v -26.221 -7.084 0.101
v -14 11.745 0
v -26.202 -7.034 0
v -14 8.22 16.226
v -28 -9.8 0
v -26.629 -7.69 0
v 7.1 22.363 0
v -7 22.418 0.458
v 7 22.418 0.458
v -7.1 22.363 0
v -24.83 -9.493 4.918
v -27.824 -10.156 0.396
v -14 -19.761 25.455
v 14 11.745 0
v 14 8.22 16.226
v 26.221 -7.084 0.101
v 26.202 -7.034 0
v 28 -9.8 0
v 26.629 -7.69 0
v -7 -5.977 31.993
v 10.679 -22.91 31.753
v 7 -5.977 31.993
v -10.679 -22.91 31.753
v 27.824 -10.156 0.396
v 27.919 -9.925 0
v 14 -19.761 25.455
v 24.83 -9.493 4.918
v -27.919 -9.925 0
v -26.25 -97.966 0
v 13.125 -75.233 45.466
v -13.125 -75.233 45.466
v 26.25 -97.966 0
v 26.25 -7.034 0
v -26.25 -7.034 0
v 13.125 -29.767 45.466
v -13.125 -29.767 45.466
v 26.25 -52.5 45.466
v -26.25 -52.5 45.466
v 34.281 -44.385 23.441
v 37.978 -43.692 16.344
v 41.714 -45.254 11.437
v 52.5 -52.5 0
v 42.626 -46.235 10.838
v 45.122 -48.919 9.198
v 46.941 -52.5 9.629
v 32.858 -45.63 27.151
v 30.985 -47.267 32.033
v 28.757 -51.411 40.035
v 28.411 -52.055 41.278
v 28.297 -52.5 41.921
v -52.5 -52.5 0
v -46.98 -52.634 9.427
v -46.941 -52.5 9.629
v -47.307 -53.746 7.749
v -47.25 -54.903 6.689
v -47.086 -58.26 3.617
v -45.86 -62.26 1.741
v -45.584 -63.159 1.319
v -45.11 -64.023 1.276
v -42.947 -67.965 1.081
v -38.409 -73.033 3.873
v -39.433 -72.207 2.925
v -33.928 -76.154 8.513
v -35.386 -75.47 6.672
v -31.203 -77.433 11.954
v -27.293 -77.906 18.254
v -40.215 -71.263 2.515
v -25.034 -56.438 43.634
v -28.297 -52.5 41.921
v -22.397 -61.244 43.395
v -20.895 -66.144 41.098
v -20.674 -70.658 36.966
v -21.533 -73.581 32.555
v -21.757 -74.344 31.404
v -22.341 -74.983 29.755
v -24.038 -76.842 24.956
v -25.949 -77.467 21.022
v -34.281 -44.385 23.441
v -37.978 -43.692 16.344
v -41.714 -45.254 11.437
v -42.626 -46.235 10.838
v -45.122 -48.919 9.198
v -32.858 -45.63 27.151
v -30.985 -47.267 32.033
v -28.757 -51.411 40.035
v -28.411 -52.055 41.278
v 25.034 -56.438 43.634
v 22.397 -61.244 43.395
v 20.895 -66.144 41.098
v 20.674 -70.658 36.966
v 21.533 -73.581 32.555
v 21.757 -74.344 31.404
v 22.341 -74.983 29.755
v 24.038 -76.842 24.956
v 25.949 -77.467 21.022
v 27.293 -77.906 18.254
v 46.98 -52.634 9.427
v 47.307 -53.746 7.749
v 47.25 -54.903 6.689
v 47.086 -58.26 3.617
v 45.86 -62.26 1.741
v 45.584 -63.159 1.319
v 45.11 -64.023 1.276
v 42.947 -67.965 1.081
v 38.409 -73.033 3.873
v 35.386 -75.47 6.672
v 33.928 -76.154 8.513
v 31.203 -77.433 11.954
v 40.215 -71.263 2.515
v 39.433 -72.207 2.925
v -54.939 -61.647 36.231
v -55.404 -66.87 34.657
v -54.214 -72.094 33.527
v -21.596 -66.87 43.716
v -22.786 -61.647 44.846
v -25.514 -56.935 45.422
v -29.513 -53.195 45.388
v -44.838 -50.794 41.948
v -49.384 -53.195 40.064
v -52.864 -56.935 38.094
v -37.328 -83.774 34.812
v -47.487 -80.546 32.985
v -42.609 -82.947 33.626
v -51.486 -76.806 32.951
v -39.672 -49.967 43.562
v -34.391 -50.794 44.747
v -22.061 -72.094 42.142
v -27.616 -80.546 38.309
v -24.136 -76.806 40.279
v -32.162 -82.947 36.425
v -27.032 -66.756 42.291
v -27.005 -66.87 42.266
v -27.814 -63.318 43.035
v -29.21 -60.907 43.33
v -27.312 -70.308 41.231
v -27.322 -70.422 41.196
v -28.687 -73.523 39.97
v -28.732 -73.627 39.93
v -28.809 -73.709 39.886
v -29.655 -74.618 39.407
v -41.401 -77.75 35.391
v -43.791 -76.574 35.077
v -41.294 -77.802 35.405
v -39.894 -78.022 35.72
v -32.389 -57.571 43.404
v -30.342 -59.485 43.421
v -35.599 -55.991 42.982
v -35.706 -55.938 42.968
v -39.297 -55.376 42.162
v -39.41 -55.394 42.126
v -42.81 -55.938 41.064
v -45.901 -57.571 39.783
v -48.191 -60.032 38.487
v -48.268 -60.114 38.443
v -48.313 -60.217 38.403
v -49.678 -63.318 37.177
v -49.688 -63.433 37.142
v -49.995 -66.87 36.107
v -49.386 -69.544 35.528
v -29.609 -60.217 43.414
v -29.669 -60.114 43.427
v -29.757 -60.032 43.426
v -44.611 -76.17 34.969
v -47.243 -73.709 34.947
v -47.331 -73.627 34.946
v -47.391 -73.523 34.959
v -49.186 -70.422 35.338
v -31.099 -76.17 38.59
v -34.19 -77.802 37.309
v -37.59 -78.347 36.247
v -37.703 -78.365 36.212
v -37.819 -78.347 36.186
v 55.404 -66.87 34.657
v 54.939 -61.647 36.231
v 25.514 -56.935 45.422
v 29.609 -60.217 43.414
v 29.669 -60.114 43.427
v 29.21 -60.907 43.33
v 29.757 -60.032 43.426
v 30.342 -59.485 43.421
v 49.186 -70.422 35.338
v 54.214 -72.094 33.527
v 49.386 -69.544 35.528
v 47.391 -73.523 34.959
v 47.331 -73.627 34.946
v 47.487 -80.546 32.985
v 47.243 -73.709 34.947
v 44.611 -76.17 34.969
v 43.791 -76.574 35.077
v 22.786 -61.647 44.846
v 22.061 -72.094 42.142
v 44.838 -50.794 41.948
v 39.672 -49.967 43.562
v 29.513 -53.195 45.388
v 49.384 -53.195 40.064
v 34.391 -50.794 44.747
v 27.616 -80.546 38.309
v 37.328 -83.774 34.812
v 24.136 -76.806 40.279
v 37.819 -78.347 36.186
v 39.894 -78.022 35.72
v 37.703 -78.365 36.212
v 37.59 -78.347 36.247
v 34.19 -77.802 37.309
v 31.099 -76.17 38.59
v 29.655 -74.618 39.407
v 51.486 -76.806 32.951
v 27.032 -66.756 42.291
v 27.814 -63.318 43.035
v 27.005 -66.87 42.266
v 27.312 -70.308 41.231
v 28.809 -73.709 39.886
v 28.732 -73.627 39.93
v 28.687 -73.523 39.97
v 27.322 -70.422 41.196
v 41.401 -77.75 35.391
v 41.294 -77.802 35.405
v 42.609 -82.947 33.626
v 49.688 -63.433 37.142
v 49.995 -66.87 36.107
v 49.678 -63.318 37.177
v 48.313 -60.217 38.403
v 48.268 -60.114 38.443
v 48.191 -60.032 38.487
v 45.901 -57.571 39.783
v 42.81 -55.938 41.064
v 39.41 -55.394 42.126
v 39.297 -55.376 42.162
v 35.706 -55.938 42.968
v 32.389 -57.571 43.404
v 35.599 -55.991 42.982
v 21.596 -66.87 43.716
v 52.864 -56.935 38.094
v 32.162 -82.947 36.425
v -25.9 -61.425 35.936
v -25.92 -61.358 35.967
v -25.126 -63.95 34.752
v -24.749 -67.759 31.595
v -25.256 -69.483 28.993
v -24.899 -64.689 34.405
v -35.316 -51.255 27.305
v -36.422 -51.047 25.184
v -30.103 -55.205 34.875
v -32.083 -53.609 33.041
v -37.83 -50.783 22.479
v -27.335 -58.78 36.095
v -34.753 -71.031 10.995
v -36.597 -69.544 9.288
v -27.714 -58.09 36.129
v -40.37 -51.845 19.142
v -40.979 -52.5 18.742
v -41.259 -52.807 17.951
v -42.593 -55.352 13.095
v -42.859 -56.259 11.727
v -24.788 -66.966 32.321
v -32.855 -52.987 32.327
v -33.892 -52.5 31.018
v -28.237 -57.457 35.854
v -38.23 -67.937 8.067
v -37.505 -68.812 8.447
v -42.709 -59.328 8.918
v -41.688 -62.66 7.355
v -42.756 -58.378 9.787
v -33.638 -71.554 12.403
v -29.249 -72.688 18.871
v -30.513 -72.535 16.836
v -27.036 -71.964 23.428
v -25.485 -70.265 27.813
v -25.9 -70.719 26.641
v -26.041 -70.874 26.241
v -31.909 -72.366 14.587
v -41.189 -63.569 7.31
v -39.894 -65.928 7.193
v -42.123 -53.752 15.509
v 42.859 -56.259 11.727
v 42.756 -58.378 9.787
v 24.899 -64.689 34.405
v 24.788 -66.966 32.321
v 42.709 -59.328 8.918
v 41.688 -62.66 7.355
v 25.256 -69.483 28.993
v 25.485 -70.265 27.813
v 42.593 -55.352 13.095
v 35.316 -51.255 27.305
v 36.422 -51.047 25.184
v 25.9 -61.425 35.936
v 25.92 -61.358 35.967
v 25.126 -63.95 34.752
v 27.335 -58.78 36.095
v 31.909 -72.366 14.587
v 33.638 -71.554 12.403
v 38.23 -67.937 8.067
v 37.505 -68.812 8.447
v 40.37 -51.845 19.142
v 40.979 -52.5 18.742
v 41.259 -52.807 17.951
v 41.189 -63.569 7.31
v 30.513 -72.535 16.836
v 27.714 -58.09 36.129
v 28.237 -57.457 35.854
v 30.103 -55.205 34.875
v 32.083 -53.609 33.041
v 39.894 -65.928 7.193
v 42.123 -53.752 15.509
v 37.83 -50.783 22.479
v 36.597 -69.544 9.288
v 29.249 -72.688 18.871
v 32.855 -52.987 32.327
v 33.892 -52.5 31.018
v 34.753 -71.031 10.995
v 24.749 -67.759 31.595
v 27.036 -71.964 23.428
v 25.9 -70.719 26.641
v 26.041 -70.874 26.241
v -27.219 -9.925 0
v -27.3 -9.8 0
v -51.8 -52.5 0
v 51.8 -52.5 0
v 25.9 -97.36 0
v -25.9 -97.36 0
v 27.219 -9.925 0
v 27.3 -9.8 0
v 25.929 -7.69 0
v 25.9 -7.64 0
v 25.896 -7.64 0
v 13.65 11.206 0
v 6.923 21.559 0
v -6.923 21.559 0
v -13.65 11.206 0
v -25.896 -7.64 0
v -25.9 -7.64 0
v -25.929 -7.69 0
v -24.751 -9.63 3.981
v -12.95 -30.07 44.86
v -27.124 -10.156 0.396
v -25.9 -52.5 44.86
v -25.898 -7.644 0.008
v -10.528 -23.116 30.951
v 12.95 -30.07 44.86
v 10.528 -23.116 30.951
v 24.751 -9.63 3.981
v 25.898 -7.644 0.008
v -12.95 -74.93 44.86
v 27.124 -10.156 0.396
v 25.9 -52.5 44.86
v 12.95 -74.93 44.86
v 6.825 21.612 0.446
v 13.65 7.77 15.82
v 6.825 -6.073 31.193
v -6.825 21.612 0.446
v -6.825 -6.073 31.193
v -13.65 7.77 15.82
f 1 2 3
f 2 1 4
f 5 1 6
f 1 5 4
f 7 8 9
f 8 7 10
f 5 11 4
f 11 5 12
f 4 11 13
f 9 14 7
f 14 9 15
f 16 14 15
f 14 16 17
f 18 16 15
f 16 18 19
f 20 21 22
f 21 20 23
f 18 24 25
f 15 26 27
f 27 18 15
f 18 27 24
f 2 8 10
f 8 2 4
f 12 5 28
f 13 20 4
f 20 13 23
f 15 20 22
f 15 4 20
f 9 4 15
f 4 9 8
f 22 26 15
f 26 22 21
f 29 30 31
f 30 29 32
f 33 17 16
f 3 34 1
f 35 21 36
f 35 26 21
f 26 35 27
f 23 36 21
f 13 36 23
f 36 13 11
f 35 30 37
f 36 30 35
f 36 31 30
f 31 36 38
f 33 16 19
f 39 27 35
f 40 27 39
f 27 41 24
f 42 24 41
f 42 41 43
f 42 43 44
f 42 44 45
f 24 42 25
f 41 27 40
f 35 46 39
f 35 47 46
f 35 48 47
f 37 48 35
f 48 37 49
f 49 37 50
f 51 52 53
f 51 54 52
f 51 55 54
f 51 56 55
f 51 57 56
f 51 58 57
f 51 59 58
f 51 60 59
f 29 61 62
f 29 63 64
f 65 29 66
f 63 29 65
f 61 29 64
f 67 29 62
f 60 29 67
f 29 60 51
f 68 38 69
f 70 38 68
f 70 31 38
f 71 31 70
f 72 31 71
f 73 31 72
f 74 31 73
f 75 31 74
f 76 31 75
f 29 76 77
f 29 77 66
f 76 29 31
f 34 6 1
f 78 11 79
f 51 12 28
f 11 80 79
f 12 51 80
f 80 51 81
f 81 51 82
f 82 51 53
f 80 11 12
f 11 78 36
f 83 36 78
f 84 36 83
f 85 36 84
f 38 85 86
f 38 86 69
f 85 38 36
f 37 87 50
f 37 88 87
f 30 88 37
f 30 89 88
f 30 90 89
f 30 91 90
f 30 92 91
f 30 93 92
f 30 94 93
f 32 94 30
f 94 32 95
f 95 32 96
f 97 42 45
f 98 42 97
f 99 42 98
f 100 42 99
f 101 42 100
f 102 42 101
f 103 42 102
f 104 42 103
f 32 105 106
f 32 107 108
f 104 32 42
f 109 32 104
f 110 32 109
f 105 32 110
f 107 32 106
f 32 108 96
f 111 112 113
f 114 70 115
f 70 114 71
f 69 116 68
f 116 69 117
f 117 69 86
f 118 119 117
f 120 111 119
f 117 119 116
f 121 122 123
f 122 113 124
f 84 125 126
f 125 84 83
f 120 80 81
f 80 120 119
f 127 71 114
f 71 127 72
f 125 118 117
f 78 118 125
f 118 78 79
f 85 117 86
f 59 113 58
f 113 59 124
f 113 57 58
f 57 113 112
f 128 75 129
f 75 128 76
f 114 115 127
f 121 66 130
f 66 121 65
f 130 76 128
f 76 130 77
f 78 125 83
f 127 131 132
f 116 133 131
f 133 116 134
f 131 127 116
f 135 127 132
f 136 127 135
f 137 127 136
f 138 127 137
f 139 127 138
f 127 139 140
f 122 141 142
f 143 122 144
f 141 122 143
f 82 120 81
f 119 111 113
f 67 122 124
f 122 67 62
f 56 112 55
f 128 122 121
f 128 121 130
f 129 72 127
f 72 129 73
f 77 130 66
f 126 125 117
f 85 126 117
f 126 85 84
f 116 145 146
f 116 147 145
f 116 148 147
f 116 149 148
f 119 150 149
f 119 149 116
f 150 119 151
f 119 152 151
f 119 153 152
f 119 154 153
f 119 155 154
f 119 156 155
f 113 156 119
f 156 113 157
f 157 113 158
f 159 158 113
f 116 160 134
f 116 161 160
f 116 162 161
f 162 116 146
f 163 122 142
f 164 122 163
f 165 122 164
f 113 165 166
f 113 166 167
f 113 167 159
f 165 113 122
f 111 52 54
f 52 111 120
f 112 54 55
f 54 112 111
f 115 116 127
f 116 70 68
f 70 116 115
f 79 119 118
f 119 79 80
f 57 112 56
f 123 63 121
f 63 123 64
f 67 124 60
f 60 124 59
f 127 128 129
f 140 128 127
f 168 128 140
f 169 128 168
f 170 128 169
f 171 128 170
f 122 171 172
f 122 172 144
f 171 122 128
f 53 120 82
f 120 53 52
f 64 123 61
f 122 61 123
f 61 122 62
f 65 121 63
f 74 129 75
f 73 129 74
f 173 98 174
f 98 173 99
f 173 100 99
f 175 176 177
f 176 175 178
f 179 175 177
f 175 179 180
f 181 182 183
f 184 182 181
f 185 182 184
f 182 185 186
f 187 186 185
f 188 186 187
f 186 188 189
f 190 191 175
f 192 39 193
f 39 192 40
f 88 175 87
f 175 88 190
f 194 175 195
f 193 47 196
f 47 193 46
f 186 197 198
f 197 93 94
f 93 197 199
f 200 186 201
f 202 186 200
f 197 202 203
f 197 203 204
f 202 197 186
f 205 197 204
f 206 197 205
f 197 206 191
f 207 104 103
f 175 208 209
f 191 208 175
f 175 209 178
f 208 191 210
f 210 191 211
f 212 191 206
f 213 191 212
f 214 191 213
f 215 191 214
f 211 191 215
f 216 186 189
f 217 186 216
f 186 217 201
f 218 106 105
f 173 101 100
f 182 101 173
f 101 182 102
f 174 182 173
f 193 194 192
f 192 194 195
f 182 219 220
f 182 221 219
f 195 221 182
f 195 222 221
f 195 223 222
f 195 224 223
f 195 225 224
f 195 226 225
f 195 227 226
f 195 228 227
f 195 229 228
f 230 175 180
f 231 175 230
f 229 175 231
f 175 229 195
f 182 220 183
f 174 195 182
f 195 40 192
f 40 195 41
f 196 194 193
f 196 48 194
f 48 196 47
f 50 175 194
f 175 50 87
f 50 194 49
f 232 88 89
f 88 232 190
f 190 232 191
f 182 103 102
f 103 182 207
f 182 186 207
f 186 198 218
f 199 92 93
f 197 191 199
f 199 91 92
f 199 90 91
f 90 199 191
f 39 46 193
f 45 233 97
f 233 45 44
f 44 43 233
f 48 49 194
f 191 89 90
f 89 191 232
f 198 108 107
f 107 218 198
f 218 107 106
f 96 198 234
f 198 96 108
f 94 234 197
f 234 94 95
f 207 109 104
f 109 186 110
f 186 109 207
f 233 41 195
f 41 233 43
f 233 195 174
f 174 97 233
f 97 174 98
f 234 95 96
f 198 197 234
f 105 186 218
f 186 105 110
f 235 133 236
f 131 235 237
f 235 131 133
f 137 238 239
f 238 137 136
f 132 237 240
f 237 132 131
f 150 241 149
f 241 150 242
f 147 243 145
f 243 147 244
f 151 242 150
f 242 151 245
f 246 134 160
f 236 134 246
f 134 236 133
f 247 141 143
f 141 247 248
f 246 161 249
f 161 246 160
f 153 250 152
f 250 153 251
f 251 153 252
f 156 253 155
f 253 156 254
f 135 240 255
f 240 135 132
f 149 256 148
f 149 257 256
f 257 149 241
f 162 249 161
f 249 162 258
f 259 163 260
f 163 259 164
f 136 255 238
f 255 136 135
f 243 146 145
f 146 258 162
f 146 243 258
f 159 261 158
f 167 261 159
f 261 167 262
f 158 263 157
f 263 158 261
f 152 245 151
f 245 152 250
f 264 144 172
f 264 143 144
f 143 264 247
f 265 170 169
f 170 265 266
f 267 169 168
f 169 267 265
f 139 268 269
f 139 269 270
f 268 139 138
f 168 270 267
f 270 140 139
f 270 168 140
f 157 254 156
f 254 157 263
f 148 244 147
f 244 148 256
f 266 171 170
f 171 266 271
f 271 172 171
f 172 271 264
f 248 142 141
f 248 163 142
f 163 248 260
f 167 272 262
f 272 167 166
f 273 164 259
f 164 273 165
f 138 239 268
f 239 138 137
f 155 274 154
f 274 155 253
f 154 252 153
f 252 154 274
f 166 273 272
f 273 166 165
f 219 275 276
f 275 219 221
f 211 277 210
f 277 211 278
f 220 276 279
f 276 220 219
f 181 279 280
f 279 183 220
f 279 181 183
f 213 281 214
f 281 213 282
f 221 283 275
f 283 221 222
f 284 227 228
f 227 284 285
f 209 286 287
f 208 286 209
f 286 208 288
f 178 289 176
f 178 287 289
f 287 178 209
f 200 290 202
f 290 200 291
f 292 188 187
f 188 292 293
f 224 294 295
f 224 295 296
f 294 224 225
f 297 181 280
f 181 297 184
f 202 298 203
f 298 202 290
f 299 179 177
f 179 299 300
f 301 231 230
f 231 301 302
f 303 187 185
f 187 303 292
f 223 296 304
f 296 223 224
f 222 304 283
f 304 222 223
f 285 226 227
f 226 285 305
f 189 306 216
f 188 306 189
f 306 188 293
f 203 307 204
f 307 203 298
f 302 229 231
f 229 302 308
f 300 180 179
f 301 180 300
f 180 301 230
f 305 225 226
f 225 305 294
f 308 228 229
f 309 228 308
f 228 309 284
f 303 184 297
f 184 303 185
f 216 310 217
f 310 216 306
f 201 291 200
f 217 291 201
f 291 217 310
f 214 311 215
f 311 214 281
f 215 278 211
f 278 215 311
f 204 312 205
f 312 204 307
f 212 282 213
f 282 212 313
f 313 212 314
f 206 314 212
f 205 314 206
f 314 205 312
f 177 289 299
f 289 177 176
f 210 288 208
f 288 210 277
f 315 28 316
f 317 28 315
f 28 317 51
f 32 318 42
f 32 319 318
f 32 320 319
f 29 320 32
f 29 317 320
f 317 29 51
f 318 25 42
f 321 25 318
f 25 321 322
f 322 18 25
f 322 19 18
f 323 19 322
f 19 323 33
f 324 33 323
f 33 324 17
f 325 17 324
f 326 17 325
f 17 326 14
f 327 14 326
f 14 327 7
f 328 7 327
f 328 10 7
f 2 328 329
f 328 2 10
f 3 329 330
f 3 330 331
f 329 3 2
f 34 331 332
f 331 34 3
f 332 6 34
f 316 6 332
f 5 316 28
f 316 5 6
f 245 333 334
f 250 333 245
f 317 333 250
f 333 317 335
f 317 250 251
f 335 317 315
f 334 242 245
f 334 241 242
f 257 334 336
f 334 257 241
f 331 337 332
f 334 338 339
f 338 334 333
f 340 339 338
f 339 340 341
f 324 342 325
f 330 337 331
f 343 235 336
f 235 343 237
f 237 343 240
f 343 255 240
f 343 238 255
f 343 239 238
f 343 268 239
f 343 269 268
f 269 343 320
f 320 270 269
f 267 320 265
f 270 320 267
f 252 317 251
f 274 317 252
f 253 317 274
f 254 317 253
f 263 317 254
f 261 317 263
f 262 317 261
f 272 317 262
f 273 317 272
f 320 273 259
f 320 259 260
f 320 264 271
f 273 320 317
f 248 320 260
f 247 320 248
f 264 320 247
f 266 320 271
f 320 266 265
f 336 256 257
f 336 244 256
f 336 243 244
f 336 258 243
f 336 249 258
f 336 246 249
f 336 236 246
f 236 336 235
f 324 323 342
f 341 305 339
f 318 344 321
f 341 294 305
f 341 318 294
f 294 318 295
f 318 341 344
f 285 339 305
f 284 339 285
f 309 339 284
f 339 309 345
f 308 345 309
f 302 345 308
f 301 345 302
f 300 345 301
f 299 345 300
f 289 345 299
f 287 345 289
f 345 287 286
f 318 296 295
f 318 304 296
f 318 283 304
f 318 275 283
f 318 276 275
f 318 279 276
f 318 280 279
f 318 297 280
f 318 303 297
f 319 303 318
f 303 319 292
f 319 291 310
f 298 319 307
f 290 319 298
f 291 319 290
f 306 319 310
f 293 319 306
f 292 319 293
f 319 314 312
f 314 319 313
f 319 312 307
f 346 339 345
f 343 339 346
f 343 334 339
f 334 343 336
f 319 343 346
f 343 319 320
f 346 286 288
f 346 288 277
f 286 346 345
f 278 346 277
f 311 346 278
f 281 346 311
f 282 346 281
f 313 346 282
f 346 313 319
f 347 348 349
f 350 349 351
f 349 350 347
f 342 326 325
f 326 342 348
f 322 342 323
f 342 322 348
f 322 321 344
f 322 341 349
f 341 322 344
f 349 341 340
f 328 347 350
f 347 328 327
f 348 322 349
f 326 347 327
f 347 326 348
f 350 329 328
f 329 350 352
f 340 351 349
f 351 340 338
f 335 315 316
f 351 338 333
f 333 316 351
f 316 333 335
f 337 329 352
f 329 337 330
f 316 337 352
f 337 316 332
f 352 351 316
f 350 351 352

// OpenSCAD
mask();

translate([0,0,-10]) linear_extrude(10) projection(cut=true) translate([0,0,-.000001]) mask();

module mask() {
    scale (1.4)
    difference() {
        $fn=6;
        union() {
            main_mask();
            tubes();
        }
        all_cutouts();
    }
}

module tubes() {
    difference() {
        union() {
            translate([-20,-40,0]) rotate([15,-15,0]) cylinder($fn=20, d=25, h=30);
            translate([20,-40,0]) rotate([15,15,0]) cylinder($fn=20, d=25, h=30);
        }
    }
}

module tubes_cutout() {
    translate([-20,-40,0]) rotate([15,-15,0]) cylinder($fn=20, d=25-8, h=31);
    translate([20,-40,0]) rotate([15,15,0]) cylinder($fn=20, d=25-8, h=31);
}

module all_cutouts() {
    tubes_cutout();
    mask_cutout();
}

module main_mask() {
    difference () {
        union() {
            translate([0,-7,0]) rotate([-48,0,0]) scale([1,1.75,1])
                hollow_sphere(40, hollow=1, thickness=1.6);
            translate([0,-37.5,0])
                hollow_sphere(hollow=1, thickness=1.6);
        }
        //translate([0,-37,0]) cylinder(d=37,h=100);
    }
}

module mask_cutout() {    
    translate([-200/2,-200/2,-200]) cube(200);
    translate([0,-37.5,0])
        hollow_sphere(diam=74, hollow=0);
    
    translate([0,-7,0]) rotate([-48,0,0]) scale([1,1.75,1])
        hollow_sphere(39, hollow=0);
}
//scale([1.4,1.4,1.4]) 

module hollow_sphere(diam=75, thickness=1, half=0, hollow=0) {
    difference() {
        sphere(d=diam);
        if (hollow) sphere(d=diam-thickness);
        if (half) translate([-diam/2,-diam/2,-diam]) cube(diam);
    }
}
